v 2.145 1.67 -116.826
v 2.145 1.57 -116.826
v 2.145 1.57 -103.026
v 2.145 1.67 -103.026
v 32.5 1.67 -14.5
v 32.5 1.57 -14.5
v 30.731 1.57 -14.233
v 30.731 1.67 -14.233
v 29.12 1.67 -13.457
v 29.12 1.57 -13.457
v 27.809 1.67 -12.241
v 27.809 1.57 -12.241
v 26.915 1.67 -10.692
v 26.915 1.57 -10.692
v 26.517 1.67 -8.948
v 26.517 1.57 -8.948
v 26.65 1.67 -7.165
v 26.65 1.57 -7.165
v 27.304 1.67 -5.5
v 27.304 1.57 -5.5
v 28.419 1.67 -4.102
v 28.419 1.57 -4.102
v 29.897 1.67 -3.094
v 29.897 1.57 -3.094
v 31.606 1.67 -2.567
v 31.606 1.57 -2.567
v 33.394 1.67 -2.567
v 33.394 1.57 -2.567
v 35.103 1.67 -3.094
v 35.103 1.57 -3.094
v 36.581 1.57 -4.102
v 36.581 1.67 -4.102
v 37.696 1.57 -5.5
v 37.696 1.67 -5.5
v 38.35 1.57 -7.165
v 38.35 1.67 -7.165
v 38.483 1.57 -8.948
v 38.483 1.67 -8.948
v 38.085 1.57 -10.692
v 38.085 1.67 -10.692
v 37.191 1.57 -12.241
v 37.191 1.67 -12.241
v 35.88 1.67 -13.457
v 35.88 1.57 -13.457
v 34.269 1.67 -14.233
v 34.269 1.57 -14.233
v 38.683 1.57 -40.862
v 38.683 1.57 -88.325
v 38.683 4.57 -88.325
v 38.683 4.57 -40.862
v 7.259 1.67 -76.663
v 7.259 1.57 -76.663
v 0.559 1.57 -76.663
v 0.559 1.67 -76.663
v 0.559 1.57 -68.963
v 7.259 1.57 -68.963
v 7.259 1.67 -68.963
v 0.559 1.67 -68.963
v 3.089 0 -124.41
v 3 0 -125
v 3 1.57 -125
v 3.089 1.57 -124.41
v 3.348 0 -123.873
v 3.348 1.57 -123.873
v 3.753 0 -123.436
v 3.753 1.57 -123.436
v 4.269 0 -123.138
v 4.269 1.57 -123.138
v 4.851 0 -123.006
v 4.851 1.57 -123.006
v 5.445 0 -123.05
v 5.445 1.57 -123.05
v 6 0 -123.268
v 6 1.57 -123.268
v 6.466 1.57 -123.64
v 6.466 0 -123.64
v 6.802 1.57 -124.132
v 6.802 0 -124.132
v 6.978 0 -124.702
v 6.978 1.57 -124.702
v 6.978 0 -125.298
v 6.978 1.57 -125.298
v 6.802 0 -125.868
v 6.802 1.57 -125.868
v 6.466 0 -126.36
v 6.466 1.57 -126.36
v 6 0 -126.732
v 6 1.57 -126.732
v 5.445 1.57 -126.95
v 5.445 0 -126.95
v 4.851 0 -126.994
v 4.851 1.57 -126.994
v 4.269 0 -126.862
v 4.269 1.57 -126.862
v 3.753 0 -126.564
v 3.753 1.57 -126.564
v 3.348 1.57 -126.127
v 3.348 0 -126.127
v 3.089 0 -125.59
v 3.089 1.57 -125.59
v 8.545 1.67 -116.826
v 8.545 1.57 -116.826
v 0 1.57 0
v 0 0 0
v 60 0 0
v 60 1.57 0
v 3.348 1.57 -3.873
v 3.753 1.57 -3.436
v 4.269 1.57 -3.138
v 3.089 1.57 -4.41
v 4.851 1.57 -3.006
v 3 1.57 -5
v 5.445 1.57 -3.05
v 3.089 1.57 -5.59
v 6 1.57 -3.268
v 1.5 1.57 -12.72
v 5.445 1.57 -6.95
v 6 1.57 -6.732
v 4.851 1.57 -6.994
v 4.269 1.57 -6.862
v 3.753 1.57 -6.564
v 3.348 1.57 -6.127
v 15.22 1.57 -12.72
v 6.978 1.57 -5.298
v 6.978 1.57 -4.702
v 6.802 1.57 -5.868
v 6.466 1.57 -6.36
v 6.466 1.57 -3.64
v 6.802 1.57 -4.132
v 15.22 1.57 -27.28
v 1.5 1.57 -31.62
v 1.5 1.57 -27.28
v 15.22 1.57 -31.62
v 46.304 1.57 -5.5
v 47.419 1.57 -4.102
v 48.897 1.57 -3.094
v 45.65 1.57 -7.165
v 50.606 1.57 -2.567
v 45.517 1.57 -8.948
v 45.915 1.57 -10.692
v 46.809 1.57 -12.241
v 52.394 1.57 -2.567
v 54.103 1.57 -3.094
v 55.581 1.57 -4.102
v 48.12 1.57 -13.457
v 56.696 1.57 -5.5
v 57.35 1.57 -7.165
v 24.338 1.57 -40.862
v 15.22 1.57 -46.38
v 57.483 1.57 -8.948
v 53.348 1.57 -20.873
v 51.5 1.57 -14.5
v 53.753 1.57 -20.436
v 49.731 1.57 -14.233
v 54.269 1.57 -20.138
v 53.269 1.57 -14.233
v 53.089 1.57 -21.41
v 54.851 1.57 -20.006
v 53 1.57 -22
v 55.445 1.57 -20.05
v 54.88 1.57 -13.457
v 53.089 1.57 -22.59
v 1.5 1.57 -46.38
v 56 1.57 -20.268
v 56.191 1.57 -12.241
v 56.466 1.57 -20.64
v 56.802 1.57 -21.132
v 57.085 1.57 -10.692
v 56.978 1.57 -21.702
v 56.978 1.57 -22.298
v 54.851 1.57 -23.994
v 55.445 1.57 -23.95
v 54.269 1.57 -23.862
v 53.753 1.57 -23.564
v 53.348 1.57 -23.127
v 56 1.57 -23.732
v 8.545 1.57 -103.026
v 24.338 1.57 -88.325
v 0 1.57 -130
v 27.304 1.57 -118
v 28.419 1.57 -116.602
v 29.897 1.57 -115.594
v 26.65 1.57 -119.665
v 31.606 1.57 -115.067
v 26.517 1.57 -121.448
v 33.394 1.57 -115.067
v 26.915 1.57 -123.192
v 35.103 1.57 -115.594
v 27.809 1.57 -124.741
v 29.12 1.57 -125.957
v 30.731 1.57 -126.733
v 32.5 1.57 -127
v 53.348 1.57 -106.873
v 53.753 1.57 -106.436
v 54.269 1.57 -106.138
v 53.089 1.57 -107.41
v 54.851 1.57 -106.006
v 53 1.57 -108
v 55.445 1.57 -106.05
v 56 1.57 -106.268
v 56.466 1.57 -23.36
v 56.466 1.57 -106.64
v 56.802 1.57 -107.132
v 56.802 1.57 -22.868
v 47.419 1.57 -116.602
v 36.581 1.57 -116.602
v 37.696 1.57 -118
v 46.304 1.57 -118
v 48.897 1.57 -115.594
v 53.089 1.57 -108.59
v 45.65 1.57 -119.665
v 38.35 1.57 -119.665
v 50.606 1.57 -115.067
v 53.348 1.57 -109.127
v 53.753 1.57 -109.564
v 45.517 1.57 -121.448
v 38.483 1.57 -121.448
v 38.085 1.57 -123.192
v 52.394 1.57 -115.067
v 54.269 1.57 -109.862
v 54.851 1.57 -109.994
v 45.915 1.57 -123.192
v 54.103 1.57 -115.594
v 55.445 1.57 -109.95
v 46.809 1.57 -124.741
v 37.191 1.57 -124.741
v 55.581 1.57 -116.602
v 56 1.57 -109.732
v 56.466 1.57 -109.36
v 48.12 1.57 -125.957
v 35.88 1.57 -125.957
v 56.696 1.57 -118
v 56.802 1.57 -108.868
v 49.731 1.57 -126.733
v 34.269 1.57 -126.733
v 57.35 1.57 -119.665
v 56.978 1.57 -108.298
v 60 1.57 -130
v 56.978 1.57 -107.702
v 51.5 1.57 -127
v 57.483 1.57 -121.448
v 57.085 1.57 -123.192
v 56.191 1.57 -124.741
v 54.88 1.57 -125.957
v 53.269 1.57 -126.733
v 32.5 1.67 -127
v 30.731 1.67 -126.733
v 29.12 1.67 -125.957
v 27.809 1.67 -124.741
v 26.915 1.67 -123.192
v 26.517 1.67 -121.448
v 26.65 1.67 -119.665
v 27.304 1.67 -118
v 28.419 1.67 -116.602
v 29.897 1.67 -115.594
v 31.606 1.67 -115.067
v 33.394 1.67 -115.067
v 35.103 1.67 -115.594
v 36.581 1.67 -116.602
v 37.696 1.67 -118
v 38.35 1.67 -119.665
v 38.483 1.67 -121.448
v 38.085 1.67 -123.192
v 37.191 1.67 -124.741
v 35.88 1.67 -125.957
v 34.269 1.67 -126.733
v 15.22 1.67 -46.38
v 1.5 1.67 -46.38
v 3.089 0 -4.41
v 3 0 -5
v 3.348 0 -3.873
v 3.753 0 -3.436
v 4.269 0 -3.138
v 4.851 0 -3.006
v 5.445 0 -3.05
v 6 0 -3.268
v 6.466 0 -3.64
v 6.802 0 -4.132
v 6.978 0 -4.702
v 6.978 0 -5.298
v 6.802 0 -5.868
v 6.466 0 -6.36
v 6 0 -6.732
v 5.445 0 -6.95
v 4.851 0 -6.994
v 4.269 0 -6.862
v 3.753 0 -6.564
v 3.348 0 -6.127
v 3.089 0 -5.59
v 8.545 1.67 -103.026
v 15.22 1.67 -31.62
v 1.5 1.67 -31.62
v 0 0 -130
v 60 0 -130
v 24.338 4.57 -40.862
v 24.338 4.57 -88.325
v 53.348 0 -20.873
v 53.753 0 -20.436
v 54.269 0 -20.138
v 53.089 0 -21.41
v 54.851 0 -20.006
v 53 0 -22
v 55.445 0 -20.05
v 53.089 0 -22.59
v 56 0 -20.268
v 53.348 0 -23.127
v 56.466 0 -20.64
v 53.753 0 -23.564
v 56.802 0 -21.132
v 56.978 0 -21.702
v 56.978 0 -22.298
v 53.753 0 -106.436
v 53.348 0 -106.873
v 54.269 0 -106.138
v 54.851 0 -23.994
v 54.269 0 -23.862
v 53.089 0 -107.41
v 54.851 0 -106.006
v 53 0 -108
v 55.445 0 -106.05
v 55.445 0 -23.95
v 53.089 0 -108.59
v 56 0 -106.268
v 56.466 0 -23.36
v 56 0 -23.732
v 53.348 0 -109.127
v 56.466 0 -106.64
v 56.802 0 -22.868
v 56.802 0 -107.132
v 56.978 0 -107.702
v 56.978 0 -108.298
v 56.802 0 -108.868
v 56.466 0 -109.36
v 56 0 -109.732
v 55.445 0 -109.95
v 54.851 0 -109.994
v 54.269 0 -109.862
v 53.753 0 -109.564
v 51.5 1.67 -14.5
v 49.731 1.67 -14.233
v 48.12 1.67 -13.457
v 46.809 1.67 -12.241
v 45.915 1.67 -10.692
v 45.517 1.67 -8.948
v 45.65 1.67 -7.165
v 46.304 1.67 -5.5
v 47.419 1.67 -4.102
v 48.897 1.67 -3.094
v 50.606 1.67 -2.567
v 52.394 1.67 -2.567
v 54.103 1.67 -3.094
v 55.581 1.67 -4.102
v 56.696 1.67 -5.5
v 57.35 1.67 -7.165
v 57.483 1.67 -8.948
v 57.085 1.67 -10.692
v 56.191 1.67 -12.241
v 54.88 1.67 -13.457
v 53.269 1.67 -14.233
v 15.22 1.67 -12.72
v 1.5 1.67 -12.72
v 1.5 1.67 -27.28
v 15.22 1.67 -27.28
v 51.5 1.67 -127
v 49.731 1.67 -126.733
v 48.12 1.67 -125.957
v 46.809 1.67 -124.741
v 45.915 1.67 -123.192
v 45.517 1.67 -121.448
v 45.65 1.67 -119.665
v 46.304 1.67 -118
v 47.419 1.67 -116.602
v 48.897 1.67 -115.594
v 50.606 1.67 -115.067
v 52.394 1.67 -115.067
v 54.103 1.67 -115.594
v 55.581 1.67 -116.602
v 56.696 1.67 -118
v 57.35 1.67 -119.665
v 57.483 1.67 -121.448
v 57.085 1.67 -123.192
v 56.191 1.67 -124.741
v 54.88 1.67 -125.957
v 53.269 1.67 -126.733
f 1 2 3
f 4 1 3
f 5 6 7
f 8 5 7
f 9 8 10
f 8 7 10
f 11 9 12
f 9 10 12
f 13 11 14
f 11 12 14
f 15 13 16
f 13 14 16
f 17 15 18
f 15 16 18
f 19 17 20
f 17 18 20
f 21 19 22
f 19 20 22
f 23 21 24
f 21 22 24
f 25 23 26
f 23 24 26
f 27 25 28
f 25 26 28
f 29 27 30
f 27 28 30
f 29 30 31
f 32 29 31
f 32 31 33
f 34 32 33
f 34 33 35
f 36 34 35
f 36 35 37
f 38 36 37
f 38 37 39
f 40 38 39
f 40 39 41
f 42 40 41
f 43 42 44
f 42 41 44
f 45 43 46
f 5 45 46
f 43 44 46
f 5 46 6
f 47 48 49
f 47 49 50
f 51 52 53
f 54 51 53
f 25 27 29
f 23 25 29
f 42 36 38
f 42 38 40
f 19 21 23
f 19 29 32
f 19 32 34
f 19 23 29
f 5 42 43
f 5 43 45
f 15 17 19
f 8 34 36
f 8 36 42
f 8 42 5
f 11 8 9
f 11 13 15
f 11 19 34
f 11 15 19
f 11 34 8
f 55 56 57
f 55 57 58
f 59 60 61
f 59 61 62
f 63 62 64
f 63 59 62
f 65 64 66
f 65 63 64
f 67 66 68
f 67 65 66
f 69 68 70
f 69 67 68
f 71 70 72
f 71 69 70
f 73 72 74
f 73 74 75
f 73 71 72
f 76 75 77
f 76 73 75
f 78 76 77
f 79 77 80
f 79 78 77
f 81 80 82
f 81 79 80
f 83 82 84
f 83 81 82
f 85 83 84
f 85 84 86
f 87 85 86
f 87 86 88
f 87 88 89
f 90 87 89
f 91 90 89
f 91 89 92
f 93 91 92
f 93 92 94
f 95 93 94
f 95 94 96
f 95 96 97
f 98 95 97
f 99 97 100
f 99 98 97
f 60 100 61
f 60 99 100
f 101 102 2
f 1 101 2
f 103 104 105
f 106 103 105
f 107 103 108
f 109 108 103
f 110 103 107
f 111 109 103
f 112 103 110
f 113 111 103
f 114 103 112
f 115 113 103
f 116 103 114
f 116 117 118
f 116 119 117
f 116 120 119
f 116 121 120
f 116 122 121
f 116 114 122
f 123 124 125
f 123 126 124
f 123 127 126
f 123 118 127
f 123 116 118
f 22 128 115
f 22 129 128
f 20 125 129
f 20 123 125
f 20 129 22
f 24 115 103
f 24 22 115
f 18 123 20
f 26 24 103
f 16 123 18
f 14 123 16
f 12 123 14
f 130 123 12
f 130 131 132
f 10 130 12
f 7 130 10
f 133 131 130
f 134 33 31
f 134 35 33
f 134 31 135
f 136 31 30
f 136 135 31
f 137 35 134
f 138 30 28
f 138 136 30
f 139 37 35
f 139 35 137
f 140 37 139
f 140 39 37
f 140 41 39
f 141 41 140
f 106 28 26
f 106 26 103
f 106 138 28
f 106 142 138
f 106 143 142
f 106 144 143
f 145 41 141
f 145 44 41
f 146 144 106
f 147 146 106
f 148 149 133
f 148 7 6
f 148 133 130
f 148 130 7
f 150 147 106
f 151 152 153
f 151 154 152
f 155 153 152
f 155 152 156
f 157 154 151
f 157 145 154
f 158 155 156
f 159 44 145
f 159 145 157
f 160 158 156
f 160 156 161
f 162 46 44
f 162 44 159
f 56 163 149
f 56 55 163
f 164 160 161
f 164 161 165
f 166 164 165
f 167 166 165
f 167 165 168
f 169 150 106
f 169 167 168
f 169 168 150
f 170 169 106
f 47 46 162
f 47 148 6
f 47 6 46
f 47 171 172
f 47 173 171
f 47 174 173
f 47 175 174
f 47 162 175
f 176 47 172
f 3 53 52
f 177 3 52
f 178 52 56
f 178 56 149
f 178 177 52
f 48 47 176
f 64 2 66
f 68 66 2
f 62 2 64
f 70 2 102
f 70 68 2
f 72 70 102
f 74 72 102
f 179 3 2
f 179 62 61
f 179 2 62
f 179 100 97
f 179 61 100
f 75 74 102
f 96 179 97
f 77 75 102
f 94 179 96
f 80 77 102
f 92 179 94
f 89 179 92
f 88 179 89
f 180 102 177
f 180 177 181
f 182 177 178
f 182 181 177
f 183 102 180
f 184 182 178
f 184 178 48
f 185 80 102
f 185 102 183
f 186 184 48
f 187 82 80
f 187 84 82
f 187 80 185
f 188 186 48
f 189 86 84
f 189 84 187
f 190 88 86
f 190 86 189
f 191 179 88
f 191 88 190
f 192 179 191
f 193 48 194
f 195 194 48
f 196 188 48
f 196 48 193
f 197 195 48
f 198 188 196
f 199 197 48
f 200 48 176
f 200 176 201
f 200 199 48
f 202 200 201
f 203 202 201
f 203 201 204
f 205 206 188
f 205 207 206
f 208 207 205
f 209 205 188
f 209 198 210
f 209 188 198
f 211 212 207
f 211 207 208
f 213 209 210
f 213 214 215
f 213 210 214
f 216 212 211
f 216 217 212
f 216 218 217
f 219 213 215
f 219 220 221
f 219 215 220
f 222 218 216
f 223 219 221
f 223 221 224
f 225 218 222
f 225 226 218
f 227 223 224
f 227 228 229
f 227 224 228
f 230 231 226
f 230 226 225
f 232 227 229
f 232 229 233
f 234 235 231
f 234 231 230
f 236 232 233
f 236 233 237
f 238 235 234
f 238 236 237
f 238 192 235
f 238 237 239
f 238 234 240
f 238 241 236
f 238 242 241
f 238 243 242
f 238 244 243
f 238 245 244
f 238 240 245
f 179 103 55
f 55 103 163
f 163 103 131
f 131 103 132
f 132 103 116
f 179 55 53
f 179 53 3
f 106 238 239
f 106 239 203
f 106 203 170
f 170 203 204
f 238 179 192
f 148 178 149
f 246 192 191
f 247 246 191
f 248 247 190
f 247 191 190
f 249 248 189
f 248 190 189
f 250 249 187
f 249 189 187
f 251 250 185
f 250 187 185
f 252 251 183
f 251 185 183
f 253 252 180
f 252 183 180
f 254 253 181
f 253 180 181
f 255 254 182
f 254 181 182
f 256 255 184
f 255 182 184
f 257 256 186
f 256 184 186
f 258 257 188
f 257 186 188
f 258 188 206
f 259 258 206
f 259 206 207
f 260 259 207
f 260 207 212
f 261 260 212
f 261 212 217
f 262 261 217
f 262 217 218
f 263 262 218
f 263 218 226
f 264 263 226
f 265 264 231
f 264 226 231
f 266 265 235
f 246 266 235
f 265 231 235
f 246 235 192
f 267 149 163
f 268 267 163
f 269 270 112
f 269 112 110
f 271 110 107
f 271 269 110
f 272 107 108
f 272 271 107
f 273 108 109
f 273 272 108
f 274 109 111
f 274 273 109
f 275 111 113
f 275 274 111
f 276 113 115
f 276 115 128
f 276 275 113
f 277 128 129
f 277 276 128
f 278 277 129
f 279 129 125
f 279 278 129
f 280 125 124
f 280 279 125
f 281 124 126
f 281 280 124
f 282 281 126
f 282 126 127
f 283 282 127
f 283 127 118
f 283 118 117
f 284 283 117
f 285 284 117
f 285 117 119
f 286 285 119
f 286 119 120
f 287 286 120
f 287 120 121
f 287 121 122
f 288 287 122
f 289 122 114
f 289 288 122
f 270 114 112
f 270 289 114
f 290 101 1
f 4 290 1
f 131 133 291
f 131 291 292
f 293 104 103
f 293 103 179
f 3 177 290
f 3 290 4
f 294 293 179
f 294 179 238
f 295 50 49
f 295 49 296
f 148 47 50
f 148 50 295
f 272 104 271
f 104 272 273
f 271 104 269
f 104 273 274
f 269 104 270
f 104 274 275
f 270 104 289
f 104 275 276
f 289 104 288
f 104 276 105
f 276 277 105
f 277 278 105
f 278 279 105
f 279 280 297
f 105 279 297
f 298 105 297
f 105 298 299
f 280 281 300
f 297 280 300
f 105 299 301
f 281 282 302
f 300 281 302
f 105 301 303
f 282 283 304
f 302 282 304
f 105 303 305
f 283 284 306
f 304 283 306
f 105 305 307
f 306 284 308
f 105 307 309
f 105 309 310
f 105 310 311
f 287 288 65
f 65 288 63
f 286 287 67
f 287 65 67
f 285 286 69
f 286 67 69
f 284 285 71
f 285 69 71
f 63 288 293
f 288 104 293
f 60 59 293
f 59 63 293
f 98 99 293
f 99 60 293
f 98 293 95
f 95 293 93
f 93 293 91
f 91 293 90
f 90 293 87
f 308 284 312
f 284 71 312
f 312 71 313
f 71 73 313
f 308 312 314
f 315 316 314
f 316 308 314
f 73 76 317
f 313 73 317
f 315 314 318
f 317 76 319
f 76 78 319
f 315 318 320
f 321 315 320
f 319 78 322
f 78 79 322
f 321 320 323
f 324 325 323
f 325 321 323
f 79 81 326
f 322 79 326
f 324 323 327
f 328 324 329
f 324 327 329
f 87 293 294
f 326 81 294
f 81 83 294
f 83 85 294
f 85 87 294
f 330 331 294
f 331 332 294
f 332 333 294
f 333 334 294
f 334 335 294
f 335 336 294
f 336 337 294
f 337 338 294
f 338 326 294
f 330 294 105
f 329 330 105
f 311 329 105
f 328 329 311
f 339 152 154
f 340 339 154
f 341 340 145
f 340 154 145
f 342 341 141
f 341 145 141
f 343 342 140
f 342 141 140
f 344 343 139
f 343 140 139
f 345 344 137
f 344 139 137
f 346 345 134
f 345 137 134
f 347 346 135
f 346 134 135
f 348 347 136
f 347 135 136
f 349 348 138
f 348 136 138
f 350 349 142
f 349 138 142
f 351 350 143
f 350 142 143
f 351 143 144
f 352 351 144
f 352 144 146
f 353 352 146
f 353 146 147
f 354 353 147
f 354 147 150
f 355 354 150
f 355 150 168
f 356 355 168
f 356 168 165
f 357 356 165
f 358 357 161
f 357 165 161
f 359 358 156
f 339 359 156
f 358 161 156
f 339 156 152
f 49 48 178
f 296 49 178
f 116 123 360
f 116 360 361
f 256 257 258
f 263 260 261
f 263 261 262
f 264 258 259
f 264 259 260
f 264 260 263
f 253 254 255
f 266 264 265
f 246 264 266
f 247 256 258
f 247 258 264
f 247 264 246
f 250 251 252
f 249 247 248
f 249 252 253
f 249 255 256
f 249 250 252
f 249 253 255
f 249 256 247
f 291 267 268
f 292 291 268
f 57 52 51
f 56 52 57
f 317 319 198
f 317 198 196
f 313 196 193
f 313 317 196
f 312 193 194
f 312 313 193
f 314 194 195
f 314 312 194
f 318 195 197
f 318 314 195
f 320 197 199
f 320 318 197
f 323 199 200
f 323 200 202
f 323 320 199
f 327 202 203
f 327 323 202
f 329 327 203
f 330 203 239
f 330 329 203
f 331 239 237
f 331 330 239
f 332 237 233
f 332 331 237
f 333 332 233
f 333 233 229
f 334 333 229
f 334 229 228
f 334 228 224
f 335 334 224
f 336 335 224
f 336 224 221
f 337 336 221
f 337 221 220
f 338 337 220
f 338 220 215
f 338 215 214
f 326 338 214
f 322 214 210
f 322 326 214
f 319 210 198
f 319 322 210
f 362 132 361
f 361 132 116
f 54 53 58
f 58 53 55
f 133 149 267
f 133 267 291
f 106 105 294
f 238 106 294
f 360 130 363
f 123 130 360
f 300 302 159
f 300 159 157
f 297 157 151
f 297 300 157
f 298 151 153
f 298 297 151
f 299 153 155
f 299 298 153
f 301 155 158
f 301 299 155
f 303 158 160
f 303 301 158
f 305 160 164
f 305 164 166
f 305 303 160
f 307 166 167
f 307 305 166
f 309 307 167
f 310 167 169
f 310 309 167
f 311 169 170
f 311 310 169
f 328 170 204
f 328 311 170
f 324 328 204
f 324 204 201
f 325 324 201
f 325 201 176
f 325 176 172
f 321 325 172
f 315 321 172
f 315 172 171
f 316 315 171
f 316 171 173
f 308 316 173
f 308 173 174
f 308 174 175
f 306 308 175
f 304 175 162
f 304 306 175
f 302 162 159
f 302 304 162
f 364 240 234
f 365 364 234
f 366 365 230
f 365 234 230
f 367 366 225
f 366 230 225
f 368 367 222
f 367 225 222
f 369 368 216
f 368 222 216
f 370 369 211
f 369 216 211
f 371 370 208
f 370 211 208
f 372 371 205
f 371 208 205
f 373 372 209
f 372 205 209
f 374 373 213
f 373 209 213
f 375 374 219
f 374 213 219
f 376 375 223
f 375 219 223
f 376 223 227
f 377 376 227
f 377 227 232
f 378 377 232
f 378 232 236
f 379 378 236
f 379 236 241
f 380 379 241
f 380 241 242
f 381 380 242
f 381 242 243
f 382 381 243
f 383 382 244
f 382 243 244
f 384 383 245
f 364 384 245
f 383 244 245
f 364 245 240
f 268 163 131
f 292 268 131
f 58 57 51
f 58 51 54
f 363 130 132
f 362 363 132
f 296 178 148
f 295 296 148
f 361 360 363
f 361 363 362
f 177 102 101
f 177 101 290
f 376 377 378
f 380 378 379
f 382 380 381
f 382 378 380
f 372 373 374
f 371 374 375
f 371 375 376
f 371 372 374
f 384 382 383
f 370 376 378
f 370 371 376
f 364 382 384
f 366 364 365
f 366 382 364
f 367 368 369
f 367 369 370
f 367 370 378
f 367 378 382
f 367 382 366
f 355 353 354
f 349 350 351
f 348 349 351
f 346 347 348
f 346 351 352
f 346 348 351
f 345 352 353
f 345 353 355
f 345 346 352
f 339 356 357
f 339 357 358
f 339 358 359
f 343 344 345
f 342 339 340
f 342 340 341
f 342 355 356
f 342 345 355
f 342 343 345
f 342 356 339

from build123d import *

# Parameters (mm, degrees)
SKETCH1_W               = 60
SKETCH1_H               = 130
BOSS_EXTRUDE1_DEPTH     = 1.57
SKETCH2_W               = 14.34441586
SKETCH2_H               = 47.463140714
BOSS_EXTRUDE2_DEPTH     = 3
BOSS_EXTRUDE6_START     = -1.57
BOSS_EXTRUDE6_OUTLINE_R = 2
BOSS_EXTRUDE6_DEPTH     = 1.57
SKETCH4_R               = 6
BOSS_EXTRUDE7_DEPTH     = 0.1
SKETCH5_W               = 13.72
SKETCH5_H               = 14.56
SKETCH5_H_2             = 14.76
BOSS_EXTRUDE8_DEPTH     = 0.1
SKETCH6_W               = 6.4
SKETCH6_H               = 13.8
BOSS_EXTRUDE9_DEPTH     = 0.1
SKETCH7_W               = 6.7
SKETCH7_H               = 7.7
BOSS_EXTRUDE10_DEPTH    = 0.1


# Read off the part's stored shape, not the designer's step: Boss-Extrude6
with BuildPart() as part:
    # Sketch1 → Boss-Extrude1 (new body)
    with BuildSketch(Plane(origin=(0, 0, 0), x_dir=(1, 0, 0), z_dir=(0, 1, 0))):
        with Locations((30, 65)):
            Rectangle(SKETCH1_W, SKETCH1_H)
    extrude(amount=BOSS_EXTRUDE1_DEPTH)

    # Sketch2 → Boss-Extrude2 (add)
    with BuildSketch(Plane(origin=(0, 1.57, 0), x_dir=(-1, 0, 0), z_dir=(0, 1, 0))):
        with Locations((-31.510634486, -64.593919343)):
            Rectangle(SKETCH2_W, SKETCH2_H)
    extrude(amount=BOSS_EXTRUDE2_DEPTH)

    # Boss-Extrude6 outline → Boss-Extrude6 (cut)
    with BuildSketch(Plane(origin=(0, 1.57, 0), x_dir=(-1, 0, 0), z_dir=(0, 1, 0)).offset(BOSS_EXTRUDE6_START)):
        with Locations((-5, -5)):
            Circle(BOSS_EXTRUDE6_OUTLINE_R)
        with Locations((-55, -22)):
            Circle(BOSS_EXTRUDE6_OUTLINE_R)
        with Locations((-5, -125)):
            Circle(BOSS_EXTRUDE6_OUTLINE_R)
        with Locations((-55, -108)):
            Circle(BOSS_EXTRUDE6_OUTLINE_R)
    extrude(amount=BOSS_EXTRUDE6_DEPTH, mode=Mode.SUBTRACT)

    # Sketch4 → Boss-Extrude7 (add)
    with BuildSketch(Plane(origin=(0, 1.57, 0), x_dir=(-1, 0, 0), z_dir=(0, 1, 0))):
        with Locations(Location((-32.5, -8.5, 0), (0, 0, 270))):
            Circle(SKETCH4_R)
        with Locations(Location((-51.5, -8.5, 0), (0, 0, 270))):
            Circle(SKETCH4_R)
        with Locations(Location((-32.5, -121, 0), (0, 0, 270))):
            Circle(SKETCH4_R)
        with Locations(Location((-51.5, -121, 0), (0, 0, 270))):
            Circle(SKETCH4_R)
    extrude(amount=BOSS_EXTRUDE7_DEPTH)

    # Sketch5 → Boss-Extrude8 (add)
    with BuildSketch(Plane(origin=(0, 1.57, 0), x_dir=(-1, 0, 0), z_dir=(0, 1, 0))):
        with Locations((-8.36, -20)):
            Rectangle(SKETCH5_W, SKETCH5_H)
        with Locations((-8.36, -39)):
            Rectangle(SKETCH5_W, SKETCH5_H_2)
    extrude(amount=BOSS_EXTRUDE8_DEPTH)

    # Sketch6 → Boss-Extrude9 (add)
    with BuildSketch(Plane(origin=(2.04497346, 1.57, -23.026190138), x_dir=(-1, 0, 0), z_dir=(0, 1, 0))):
        with Locations((-3.3, -86.9)):
            Rectangle(SKETCH6_W, SKETCH6_H)
    extrude(amount=BOSS_EXTRUDE9_DEPTH)

    # Sketch7 → Boss-Extrude10 (add)
    with BuildSketch(Plane(origin=(0.458943498, 1.57, 31.036587212), x_dir=(-1, 0, 0), z_dir=(0, 1, 0))):
        with Locations((-3.45, -103.85)):
            Rectangle(SKETCH7_W, SKETCH7_H)
    extrude(amount=BOSS_EXTRUDE10_DEPTH)


solid = part.part
